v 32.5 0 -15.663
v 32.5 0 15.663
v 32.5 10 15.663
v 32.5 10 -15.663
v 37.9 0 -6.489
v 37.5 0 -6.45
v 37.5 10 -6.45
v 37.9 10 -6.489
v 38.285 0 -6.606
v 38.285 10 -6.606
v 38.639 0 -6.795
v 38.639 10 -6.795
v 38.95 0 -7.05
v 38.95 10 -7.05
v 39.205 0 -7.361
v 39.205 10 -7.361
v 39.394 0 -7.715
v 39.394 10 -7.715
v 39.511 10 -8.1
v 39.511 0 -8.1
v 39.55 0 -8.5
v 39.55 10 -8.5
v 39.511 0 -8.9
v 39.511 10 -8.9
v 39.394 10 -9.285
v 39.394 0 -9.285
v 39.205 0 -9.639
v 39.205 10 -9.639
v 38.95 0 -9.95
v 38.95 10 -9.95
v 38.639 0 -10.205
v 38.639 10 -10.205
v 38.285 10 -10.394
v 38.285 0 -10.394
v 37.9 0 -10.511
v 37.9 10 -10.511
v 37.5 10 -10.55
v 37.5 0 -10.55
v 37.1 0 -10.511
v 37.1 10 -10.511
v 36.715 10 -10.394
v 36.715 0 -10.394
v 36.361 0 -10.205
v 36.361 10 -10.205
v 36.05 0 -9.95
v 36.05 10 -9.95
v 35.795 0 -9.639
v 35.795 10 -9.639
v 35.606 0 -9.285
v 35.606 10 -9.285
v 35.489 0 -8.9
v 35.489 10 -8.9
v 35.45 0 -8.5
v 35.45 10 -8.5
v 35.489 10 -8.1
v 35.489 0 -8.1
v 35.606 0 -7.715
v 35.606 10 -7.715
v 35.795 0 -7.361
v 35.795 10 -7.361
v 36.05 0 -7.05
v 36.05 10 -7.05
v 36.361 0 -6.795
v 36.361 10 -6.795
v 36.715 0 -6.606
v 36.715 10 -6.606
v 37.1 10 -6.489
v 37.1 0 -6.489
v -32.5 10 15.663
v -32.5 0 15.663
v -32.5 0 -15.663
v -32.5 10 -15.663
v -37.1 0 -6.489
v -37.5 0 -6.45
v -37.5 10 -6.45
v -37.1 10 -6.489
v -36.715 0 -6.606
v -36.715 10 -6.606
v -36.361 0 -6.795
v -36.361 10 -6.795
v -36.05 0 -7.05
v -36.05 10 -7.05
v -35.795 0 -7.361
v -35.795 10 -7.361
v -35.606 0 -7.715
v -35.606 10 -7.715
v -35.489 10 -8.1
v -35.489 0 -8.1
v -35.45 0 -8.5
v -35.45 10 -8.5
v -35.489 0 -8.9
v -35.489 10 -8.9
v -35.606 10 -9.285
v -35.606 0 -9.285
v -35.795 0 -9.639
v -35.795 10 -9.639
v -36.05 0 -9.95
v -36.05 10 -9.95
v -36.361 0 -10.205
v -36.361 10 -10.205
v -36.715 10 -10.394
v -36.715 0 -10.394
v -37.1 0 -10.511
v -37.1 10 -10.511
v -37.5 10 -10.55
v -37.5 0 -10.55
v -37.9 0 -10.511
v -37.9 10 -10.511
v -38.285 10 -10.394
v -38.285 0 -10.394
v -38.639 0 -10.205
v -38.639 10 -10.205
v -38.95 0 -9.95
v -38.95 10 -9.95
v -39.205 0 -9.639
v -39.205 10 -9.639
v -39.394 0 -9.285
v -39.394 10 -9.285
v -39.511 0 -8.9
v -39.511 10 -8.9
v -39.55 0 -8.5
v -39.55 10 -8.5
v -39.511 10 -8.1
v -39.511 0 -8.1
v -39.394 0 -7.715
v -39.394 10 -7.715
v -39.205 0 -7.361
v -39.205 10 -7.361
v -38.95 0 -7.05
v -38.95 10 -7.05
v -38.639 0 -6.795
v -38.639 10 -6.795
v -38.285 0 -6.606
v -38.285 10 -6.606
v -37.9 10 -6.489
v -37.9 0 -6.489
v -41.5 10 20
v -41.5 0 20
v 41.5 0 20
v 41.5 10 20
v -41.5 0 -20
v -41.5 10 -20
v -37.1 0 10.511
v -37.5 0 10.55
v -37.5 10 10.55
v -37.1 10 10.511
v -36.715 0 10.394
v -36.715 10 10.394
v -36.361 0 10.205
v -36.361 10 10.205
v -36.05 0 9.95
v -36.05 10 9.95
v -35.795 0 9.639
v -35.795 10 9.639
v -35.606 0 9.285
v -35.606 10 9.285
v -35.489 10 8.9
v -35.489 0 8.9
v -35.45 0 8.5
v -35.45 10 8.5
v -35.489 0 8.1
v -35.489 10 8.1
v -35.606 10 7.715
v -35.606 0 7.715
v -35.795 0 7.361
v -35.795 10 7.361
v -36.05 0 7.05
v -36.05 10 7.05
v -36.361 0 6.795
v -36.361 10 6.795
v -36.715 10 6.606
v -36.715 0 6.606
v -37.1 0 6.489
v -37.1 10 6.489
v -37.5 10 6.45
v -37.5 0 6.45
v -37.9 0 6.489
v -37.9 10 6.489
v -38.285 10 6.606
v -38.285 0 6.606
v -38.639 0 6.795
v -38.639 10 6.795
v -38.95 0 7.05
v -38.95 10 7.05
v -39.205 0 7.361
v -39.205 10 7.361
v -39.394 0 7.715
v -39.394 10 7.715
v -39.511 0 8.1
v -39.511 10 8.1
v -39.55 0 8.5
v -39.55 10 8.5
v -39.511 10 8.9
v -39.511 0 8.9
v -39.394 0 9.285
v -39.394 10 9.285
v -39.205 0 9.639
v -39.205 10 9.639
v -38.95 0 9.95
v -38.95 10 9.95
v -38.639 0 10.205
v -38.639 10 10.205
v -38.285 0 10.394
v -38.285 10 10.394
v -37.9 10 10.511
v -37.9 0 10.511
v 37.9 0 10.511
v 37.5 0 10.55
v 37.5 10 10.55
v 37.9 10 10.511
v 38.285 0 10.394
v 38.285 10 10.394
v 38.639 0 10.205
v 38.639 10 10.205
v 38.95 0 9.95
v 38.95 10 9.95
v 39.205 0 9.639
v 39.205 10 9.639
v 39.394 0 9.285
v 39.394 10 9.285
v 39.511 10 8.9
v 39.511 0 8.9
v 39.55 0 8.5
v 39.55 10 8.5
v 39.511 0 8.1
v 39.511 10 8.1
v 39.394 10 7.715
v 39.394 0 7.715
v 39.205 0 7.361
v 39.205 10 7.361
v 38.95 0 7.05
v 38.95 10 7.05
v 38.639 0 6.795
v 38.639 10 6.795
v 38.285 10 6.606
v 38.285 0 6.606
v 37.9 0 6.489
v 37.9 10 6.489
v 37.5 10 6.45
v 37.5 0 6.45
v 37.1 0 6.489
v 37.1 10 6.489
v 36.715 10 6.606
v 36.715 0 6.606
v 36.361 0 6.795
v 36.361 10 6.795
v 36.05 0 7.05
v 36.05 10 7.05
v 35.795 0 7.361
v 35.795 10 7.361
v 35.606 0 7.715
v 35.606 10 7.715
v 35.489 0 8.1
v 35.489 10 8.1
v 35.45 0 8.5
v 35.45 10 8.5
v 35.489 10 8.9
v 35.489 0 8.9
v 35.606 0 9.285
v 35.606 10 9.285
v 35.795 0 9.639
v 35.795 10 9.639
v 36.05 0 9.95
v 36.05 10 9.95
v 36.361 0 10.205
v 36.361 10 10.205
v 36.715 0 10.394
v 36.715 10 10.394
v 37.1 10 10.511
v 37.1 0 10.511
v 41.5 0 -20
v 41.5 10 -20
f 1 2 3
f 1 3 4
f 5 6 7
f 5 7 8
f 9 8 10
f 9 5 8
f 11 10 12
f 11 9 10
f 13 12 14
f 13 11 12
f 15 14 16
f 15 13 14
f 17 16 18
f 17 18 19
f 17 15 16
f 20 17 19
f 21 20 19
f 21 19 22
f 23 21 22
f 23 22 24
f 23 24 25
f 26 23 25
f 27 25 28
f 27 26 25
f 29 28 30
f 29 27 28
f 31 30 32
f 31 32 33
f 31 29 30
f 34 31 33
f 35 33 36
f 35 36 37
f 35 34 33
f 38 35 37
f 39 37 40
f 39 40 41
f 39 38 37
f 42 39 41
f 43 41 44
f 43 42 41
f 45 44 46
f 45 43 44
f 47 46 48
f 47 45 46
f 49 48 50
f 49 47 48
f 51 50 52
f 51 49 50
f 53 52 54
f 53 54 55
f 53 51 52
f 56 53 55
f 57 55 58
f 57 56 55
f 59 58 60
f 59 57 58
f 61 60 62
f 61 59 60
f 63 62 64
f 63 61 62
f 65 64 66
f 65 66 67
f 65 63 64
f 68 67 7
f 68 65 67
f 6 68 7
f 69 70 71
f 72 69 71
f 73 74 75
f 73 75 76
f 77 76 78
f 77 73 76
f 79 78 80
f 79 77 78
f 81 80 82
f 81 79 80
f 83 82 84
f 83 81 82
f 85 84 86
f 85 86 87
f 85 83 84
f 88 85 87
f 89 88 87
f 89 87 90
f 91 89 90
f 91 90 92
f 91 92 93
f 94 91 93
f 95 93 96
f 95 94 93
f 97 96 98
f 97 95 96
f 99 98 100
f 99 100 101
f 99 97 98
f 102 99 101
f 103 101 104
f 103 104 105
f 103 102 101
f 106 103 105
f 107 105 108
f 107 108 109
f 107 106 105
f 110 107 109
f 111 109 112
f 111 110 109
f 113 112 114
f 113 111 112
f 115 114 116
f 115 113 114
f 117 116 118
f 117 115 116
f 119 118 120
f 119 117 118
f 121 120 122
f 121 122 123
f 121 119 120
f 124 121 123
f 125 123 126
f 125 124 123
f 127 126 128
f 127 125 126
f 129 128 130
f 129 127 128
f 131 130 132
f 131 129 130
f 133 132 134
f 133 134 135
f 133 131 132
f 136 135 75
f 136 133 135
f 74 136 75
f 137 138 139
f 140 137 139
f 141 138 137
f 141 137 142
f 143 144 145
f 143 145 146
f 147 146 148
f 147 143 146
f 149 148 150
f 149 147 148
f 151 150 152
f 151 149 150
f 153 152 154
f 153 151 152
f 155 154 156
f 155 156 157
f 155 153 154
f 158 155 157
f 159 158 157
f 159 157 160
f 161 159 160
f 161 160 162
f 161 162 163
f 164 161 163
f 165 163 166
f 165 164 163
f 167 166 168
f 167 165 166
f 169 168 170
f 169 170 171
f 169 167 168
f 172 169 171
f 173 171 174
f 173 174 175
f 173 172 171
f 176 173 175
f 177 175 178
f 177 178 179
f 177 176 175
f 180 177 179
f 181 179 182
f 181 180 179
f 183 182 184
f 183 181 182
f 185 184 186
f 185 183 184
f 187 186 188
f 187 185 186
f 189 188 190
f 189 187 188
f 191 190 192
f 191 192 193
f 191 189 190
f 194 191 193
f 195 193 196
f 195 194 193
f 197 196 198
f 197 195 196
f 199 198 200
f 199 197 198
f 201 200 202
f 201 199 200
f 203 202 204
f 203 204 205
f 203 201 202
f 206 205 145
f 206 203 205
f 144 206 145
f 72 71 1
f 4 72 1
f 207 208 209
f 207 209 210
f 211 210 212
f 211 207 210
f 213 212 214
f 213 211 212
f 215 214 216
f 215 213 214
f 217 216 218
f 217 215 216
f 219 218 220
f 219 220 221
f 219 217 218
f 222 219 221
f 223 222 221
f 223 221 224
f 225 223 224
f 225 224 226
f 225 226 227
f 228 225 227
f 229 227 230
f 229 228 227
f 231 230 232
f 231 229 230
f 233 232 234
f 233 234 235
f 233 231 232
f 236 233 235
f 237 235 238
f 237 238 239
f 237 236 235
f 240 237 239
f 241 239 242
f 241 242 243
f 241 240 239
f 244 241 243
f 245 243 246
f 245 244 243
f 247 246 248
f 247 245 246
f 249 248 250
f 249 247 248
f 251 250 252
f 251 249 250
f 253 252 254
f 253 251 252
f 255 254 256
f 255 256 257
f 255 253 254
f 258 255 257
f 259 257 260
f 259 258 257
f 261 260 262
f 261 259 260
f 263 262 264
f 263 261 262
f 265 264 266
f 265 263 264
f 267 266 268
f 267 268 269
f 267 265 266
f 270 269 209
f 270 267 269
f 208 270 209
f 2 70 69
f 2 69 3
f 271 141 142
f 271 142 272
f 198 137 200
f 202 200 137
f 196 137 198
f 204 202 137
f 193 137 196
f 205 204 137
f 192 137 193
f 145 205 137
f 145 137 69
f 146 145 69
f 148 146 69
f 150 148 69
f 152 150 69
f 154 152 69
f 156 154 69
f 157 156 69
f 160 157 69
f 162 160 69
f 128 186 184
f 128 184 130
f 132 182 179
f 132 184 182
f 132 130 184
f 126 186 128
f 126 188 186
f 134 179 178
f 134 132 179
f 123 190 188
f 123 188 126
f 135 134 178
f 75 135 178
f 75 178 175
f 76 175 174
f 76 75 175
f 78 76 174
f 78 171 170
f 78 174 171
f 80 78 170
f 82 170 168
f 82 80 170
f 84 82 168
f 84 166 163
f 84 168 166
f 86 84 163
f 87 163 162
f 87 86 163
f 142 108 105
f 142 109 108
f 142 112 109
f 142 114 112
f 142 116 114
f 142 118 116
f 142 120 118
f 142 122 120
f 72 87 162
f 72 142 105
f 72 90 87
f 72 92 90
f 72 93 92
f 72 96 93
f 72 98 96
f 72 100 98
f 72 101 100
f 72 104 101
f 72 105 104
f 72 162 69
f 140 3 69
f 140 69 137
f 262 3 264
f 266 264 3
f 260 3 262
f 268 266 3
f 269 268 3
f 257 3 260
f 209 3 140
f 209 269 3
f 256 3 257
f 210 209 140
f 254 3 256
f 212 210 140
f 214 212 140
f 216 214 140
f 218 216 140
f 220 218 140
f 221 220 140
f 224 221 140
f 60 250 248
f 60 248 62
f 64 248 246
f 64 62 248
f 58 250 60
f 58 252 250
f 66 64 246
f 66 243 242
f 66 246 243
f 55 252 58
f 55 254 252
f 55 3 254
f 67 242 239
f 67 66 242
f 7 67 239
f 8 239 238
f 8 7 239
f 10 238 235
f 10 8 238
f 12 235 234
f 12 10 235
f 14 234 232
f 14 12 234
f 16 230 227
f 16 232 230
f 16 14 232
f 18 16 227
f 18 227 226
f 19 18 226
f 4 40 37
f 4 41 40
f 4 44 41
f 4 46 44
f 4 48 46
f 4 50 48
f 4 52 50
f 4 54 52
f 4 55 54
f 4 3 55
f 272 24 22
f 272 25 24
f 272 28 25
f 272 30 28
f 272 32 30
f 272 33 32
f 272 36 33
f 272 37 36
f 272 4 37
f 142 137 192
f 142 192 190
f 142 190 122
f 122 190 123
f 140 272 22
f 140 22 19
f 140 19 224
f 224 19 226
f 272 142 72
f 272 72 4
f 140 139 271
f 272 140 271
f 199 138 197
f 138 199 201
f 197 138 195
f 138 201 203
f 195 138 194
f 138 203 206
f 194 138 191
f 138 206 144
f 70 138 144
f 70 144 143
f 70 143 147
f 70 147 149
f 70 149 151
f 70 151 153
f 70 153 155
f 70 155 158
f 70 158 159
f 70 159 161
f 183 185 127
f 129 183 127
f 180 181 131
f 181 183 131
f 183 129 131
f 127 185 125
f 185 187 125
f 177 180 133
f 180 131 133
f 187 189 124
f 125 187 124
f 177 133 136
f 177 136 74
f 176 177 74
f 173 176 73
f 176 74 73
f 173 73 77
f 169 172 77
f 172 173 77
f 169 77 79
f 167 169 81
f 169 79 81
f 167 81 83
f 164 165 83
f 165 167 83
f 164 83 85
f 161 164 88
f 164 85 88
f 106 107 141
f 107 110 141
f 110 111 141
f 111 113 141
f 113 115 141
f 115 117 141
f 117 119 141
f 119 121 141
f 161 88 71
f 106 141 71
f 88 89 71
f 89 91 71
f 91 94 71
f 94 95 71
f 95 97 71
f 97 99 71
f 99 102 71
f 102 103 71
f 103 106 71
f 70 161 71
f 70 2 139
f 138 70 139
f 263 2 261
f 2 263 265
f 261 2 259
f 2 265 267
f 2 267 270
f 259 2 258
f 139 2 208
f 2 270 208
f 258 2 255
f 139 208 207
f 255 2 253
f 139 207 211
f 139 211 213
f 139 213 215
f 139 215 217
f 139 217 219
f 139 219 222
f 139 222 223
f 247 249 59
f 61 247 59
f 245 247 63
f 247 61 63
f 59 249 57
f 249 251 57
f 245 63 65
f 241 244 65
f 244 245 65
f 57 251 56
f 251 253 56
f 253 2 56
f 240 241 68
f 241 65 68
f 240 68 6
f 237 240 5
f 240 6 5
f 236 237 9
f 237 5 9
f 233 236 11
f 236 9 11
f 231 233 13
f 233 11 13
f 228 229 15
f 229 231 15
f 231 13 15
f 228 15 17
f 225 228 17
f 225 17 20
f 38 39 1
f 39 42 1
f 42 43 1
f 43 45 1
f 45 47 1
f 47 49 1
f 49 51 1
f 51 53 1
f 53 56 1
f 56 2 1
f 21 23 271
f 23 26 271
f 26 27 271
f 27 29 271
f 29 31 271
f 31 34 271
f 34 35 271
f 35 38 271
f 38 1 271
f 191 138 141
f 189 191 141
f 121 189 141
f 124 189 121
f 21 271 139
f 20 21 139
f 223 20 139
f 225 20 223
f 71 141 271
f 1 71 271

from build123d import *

# Parameters (mm, degrees)
SKETCH1_W           = 83
SKETCH1_H           = 40
SKETCH1_R           = 2.05
SKETCH1_W_2         = 65
SKETCH1_H_2         = 31.325301204
BOSS_EXTRUDE1_DEPTH = 10


with BuildPart() as part:
    # Sketch1 → Boss-Extrude1 (new body)
    with BuildSketch(Plane(origin=(0, 0, 0), x_dir=(1, 0, 0), z_dir=(0, 1, 0))):
        Rectangle(SKETCH1_W, SKETCH1_H)
        with Locations(Location((-37.5, 8.5, 0), (0, 0, 270))):
            Circle(SKETCH1_R, mode=Mode.SUBTRACT)
        with Locations(Location((-37.5, -8.5, 0), (0, 0, 270))):
            Circle(SKETCH1_R, mode=Mode.SUBTRACT)
        with Locations(Location((37.5, -8.5, 0), (0, 0, 270))):
            Circle(SKETCH1_R, mode=Mode.SUBTRACT)
        with Locations(Location((37.5, 8.5, 0), (0, 0, 270))):
            Circle(SKETCH1_R, mode=Mode.SUBTRACT)
        Rectangle(SKETCH1_W_2, SKETCH1_H_2, mode=Mode.SUBTRACT)
    extrude(amount=BOSS_EXTRUDE1_DEPTH)


solid = part.part
